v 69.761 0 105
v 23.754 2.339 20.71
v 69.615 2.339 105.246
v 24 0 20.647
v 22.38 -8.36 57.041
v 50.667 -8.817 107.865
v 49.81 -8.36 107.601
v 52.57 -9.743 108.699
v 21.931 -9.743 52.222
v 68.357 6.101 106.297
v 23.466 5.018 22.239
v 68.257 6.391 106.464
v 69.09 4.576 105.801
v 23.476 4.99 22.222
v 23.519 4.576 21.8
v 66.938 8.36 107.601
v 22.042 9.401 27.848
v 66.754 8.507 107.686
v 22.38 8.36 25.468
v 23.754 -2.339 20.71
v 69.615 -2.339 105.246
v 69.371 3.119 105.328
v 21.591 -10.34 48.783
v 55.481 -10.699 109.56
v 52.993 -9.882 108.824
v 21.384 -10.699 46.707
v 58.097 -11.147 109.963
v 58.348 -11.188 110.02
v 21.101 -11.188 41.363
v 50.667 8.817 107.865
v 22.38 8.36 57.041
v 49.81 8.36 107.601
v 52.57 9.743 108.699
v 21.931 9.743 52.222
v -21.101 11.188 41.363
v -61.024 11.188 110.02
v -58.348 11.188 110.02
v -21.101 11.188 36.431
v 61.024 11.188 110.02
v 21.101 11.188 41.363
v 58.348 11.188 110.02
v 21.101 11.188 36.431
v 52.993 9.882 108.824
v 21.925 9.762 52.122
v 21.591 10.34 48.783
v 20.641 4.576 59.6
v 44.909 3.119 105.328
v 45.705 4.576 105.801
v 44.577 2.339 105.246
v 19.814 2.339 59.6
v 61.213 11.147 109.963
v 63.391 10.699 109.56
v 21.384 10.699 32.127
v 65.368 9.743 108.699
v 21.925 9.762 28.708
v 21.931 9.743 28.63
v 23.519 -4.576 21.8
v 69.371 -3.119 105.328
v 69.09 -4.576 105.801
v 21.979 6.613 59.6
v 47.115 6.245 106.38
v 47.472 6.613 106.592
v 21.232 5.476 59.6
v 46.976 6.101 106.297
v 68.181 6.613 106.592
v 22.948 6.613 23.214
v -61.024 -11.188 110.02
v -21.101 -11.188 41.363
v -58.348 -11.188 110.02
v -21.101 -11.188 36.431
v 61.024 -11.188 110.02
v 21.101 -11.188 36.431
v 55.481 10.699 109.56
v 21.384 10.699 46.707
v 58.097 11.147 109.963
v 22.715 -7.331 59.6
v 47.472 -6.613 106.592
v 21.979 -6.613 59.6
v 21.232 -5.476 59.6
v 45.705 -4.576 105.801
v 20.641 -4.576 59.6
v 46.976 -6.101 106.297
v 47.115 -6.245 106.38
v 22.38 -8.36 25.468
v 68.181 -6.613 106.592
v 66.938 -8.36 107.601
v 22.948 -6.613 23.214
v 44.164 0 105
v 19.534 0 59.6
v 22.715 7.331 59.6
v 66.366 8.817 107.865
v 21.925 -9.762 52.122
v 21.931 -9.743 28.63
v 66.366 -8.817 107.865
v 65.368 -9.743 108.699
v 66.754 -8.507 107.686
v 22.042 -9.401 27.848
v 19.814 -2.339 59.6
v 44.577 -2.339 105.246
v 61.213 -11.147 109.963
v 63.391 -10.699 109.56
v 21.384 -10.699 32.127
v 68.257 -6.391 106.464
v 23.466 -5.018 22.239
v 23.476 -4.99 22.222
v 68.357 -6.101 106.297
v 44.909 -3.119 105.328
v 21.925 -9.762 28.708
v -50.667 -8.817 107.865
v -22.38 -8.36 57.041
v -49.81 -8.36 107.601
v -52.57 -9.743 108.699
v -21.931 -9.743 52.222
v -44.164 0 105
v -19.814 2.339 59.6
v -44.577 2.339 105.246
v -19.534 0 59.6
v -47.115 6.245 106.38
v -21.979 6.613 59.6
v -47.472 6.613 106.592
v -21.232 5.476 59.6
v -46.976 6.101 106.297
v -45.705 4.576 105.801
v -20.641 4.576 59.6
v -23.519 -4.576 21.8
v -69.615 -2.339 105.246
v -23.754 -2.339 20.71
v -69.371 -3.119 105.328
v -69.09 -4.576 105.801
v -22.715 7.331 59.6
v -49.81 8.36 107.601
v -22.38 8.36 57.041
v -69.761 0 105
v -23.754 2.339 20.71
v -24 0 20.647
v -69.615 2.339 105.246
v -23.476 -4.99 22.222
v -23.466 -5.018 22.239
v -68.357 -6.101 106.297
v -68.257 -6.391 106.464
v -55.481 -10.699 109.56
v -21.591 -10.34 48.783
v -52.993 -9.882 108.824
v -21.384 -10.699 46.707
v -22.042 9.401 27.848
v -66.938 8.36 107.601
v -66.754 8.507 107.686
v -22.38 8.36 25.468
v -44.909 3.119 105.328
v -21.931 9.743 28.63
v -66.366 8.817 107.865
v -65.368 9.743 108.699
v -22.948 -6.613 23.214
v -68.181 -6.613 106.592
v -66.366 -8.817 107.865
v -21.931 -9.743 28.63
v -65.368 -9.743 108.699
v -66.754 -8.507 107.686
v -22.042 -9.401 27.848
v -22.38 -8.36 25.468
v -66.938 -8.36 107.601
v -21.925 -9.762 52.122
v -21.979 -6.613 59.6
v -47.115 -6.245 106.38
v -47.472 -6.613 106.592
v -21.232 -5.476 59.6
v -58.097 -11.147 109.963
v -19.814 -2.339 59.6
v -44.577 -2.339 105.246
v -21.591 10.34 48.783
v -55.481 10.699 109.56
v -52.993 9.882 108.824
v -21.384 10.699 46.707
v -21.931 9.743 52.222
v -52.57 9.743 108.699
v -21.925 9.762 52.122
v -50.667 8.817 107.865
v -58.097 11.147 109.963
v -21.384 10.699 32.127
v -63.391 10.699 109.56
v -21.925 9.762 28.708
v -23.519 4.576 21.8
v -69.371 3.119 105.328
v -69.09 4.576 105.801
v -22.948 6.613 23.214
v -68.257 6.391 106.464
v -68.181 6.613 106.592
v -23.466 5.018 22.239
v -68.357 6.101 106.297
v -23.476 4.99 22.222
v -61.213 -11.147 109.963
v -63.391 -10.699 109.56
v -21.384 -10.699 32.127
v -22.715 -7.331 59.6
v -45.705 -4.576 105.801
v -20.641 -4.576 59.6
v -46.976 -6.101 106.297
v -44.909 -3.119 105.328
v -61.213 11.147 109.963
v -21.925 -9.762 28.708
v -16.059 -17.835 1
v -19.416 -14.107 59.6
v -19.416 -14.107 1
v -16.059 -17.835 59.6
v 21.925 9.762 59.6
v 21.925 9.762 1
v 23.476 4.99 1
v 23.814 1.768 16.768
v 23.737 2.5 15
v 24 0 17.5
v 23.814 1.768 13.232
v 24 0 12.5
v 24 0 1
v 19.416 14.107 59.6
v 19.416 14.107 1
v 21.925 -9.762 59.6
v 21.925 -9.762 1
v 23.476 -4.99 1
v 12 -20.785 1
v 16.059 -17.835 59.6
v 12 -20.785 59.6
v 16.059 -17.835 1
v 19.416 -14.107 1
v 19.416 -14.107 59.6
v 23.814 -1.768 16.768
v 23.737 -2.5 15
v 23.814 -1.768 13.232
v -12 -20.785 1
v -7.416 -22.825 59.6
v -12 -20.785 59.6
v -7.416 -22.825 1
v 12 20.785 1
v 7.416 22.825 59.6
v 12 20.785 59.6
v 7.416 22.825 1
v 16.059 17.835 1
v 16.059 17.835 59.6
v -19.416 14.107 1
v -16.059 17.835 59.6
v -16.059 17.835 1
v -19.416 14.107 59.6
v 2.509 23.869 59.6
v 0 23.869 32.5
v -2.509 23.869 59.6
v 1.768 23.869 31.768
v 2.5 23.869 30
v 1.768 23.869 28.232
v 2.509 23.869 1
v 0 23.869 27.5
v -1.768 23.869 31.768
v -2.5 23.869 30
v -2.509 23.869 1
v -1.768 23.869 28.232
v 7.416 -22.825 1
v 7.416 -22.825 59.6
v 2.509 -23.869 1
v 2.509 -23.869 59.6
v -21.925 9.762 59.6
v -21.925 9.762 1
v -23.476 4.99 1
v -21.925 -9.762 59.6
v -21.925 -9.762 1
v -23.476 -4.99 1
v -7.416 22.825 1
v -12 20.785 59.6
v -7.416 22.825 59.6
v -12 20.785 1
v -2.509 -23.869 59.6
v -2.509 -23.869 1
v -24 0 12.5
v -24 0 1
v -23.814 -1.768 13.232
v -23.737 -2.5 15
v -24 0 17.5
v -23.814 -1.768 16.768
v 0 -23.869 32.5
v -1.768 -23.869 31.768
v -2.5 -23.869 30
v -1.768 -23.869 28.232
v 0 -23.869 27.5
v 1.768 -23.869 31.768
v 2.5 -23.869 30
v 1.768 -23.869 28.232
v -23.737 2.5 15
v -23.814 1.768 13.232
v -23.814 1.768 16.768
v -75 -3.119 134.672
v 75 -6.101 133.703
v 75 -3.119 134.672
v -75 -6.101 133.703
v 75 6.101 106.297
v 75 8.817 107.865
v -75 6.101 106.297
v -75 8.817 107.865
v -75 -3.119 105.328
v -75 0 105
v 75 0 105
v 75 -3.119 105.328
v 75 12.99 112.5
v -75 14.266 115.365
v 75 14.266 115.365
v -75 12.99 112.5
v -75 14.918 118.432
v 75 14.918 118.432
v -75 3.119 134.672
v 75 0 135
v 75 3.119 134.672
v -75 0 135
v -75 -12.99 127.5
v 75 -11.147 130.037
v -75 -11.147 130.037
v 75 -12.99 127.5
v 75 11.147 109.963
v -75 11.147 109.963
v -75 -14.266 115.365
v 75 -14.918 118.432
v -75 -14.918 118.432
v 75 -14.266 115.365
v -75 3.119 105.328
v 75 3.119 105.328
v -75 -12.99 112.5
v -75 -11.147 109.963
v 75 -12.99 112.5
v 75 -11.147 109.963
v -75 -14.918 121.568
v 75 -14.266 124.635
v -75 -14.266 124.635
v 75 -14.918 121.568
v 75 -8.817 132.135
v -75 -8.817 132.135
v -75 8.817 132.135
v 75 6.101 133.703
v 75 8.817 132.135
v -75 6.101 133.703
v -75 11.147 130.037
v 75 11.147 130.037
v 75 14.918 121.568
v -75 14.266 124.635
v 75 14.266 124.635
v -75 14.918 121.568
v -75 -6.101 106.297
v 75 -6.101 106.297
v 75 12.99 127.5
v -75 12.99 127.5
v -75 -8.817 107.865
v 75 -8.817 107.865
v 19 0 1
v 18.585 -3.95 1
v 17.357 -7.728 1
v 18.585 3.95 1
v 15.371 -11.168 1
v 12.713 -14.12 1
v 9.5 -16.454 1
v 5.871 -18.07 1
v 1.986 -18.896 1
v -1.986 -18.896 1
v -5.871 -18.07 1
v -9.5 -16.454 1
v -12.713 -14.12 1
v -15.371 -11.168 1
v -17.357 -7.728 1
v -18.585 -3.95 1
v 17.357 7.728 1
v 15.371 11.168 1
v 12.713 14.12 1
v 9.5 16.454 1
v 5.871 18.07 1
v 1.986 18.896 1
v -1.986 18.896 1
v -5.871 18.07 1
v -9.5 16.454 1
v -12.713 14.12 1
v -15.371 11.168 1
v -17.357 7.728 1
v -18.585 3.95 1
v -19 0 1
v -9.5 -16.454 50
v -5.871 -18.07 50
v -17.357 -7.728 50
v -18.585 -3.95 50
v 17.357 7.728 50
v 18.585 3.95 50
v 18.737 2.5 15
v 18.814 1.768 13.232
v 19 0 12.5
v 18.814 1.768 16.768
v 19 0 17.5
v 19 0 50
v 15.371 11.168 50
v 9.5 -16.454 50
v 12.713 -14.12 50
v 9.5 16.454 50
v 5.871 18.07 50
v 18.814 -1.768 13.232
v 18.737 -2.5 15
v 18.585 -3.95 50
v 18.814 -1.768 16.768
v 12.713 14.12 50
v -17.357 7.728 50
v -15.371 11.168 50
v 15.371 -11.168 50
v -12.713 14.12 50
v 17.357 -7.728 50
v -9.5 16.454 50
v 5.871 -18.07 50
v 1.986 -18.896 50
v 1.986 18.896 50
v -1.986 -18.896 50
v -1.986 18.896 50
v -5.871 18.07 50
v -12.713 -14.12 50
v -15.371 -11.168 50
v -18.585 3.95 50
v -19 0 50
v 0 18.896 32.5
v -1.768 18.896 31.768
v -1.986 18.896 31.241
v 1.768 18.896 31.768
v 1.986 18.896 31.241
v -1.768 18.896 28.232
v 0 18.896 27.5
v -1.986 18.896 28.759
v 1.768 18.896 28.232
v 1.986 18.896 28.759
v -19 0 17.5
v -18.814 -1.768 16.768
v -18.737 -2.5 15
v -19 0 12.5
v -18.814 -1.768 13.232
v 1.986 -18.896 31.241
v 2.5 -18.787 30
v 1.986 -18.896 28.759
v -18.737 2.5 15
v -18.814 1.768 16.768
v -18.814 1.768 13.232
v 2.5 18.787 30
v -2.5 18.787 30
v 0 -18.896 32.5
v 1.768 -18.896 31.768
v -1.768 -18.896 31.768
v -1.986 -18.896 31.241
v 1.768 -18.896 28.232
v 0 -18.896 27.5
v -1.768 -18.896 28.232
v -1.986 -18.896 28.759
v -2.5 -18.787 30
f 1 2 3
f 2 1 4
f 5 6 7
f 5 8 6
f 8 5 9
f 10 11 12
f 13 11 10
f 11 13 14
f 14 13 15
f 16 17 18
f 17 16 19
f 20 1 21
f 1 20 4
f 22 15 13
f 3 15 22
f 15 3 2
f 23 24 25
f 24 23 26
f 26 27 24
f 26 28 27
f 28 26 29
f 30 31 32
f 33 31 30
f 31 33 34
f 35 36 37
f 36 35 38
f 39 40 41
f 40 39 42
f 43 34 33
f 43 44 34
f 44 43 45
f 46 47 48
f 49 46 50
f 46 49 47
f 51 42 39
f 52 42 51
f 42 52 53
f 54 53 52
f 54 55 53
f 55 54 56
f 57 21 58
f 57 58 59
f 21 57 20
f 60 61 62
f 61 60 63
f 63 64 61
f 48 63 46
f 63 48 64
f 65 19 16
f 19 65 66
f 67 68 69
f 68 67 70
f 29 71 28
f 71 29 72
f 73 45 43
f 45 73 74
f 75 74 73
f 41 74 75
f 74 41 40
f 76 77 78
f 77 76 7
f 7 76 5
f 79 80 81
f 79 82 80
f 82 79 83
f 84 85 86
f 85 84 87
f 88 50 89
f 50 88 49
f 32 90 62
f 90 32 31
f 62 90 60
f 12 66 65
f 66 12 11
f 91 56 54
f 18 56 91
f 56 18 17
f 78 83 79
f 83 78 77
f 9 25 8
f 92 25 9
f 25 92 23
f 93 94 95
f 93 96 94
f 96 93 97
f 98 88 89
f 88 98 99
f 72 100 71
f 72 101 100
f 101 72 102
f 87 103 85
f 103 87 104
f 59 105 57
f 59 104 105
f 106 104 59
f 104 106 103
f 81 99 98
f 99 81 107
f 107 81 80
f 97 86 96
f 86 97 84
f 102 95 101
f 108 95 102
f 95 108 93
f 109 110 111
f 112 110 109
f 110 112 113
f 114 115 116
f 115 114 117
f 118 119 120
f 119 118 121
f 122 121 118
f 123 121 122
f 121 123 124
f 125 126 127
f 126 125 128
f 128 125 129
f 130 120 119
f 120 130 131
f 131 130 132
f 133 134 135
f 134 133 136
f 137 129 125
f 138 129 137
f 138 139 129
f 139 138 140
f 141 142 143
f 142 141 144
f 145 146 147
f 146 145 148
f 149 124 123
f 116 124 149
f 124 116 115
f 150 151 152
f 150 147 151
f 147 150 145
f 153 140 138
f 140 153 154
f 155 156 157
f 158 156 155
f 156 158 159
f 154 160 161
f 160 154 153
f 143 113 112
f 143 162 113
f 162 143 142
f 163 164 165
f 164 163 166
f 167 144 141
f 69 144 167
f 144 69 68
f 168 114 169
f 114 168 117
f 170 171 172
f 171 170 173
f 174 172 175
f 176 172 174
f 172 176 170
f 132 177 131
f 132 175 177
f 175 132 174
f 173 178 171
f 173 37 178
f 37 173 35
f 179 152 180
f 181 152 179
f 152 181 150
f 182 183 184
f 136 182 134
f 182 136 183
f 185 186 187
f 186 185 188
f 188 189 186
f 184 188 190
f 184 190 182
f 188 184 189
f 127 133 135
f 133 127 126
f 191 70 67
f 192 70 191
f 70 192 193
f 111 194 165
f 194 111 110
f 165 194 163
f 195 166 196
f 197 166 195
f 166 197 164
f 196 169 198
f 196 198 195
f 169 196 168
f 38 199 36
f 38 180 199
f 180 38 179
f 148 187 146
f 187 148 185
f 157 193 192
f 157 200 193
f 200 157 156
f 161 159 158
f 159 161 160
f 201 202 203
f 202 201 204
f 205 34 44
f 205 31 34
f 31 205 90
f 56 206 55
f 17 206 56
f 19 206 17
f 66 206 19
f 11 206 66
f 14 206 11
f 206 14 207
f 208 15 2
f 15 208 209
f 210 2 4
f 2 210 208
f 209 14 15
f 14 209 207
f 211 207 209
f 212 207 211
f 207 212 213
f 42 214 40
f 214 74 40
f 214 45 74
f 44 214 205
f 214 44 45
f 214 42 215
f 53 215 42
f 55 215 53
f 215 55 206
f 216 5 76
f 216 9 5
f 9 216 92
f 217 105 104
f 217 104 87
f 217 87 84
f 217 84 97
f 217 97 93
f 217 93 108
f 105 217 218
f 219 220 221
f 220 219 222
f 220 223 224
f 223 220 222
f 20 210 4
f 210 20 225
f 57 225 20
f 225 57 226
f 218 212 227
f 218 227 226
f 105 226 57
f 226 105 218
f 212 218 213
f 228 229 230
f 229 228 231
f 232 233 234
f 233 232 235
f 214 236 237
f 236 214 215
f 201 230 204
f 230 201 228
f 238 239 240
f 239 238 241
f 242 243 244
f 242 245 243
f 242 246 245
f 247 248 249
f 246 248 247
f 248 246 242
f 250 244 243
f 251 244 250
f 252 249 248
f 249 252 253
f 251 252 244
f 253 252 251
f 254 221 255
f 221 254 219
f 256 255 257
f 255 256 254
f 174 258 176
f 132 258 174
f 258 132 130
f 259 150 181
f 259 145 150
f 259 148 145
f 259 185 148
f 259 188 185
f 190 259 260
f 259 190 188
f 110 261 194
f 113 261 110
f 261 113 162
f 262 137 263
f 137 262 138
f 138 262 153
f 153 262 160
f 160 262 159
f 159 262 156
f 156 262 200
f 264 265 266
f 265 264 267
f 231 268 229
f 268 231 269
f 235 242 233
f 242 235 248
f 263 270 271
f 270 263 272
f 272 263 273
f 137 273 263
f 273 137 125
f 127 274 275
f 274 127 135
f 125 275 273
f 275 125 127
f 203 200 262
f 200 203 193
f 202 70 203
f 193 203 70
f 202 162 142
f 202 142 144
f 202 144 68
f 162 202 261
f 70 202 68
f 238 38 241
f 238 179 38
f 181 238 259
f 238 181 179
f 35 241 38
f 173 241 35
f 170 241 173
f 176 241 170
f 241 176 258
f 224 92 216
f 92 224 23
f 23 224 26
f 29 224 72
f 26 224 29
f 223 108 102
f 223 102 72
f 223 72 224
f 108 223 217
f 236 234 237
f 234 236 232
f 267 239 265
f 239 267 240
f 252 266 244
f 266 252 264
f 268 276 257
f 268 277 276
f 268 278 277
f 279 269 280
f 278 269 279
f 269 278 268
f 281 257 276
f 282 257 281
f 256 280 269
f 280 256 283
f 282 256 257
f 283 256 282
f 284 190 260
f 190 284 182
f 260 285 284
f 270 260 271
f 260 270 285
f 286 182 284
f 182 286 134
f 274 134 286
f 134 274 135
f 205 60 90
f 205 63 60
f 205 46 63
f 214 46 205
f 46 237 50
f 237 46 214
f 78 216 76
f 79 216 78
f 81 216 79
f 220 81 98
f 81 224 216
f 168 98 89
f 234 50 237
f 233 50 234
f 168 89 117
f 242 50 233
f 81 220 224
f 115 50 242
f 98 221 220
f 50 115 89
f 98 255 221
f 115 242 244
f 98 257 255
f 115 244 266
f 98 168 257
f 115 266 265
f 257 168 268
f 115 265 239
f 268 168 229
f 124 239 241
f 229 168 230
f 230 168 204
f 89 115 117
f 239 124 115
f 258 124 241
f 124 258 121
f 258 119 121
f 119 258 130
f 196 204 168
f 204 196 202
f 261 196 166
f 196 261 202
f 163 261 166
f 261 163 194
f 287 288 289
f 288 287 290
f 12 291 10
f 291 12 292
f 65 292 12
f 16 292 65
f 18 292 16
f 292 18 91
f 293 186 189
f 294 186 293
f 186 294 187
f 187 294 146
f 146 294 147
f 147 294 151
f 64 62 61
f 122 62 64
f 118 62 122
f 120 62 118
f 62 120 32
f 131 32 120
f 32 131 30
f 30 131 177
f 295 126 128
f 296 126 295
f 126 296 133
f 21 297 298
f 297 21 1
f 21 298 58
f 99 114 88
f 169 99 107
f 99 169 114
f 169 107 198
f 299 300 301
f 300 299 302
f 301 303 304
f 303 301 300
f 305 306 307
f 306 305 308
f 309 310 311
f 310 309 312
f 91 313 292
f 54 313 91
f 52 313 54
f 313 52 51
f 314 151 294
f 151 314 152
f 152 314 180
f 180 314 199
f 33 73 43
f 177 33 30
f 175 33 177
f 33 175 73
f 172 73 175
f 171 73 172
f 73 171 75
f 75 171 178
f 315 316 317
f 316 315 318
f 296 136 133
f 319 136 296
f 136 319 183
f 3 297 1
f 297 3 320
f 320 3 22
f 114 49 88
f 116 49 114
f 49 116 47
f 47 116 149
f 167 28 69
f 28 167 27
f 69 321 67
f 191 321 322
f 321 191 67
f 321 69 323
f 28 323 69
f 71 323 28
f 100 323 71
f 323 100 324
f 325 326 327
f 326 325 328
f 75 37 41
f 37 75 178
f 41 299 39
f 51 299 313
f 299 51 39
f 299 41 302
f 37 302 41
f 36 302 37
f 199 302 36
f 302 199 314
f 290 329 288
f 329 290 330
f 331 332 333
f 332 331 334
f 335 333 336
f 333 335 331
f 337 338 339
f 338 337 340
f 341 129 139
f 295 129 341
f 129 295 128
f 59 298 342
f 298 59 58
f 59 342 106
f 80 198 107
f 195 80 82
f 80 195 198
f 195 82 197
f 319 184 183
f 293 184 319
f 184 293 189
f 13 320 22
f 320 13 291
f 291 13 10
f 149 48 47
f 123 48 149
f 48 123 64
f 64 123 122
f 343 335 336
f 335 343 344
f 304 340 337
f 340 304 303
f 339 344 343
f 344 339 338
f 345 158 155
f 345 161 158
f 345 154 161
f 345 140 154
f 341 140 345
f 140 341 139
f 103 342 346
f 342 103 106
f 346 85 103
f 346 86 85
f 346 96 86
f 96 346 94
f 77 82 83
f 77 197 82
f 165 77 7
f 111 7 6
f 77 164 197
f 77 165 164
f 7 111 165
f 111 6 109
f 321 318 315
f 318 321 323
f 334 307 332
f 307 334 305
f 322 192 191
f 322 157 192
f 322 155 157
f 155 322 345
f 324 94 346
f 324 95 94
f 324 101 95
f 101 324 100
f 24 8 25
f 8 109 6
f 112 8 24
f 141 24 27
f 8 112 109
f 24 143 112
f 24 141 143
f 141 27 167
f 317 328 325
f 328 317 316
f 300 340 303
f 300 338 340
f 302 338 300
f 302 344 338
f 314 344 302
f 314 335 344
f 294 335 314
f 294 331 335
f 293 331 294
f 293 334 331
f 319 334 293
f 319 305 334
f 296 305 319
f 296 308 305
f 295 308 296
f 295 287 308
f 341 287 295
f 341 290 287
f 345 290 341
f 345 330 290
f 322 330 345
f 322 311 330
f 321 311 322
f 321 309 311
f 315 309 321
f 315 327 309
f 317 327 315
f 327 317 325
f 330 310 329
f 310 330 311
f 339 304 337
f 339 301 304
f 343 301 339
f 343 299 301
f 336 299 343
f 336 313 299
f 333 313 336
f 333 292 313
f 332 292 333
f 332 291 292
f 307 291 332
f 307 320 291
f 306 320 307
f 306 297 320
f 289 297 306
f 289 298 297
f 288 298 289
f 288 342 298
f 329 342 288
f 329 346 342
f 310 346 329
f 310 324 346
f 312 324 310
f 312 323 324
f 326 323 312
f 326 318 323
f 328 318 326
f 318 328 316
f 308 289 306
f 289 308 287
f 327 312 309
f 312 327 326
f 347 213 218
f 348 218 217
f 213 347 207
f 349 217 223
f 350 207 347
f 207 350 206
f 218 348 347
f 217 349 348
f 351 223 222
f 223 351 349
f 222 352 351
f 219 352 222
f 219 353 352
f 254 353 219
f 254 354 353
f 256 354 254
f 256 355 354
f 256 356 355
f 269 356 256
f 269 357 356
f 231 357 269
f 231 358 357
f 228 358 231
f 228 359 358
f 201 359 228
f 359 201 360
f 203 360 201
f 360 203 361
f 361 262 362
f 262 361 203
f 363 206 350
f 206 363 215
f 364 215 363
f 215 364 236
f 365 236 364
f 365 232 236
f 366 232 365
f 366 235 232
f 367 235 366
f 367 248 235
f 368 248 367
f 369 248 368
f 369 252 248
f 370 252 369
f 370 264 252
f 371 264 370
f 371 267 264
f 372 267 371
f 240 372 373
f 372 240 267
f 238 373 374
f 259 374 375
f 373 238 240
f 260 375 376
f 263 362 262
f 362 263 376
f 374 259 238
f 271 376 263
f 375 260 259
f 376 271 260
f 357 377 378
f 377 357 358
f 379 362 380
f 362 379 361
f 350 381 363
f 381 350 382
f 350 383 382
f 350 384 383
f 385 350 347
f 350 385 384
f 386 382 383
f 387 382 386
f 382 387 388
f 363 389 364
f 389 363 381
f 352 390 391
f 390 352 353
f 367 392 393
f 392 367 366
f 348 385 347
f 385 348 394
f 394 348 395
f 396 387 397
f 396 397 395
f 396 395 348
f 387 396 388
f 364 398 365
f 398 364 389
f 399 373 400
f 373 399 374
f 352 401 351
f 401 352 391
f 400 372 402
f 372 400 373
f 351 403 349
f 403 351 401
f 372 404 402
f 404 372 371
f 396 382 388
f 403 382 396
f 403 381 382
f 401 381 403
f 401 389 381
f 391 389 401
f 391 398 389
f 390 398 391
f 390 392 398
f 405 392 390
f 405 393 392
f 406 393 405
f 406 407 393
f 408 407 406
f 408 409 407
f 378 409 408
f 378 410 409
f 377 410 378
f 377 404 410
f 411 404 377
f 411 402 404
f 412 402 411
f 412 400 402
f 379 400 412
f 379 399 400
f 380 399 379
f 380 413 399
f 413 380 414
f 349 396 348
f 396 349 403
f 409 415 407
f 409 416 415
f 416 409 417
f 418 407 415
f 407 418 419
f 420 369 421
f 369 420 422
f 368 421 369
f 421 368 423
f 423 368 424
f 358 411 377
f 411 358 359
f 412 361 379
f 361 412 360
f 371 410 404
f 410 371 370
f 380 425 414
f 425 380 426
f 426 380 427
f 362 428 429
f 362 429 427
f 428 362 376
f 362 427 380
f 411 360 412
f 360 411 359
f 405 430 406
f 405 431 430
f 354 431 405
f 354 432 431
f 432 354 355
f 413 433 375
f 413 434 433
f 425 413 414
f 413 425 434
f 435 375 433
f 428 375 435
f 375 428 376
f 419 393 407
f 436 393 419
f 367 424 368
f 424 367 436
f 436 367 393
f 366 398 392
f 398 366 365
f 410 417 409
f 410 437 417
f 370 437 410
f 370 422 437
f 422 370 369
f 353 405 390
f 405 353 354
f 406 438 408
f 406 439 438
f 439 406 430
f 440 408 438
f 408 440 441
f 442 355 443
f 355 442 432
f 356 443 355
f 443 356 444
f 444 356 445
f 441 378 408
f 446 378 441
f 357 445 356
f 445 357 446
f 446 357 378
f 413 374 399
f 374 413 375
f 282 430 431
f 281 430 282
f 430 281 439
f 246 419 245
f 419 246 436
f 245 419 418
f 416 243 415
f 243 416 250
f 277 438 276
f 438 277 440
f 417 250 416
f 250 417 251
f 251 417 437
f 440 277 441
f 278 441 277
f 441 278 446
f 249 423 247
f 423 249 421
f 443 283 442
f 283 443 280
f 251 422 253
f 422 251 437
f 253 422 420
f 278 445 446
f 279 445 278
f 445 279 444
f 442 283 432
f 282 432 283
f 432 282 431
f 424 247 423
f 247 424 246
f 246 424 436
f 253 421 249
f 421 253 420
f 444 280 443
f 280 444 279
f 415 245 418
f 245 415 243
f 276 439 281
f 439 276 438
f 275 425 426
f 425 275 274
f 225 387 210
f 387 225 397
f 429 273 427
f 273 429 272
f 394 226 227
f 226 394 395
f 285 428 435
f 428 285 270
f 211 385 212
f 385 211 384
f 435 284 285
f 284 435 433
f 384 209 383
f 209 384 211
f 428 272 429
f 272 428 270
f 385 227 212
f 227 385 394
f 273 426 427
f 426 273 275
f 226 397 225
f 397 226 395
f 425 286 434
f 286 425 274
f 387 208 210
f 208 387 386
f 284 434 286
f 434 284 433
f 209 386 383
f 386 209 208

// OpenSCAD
/*[Overall Dimesnions]*/

// length of overlap on handle
O_Length = 50;

// Inner Diameter of overlap
In_Dia = 38;

// Outer diamter of overlap
Out_Dia = 48;

// length from start of overlap to center of grip
S_Length = 120;

// diameter of Grip
G_Dia = 30;

// length of grip
G_Length = 150;

// distance to trim (leave here at 40, unless model comes out with excess from the rods)
trim = 40;

/*[mounting holes]*/

// You can have up to 3 holes, for more add to the source code
// Holes will be completly through from one side to the other of the overlap

// Hole 1 diameter
H1_Dia = 5;

// Hole 1 X location
H1_X = 0;

// Hole 1 Y location
H1_Y = 0;

// Hole 1 Z loaction
H1_Z = 30;

// Hole 1 X Rotation
H1_Xrot = 90;

// Hole 1 Y Rotaion
H1_Yrot = 0;

// Hole 1 Z Rotation
H1_Zrot = 0;

// Hole 2 diameter ((leave at 0 to not have))
H2_Dia = 5;

// Hole 2 X location
H2_X = 0;

// Hole 2 Y location
H2_Y = 0;

// Hole 2 Z loaction
H2_Z = 15;

// Hole 2 X Rotation
H2_Xrot = 0;

// Hole 2 Y Rotaion
H2_Yrot = 90;

// Hole 2 Z Rotation
H2_Zrot = 0;

// Hole 3 diameter ((leave at 0 to not have))
H3_Dia = 0;

// Hole 3 X location
H3_X = 0;

// Hole 3 Y location
H3_Y = 0;

// Hole 3 Z loaction
H3_Z = 0;

// Hole 3 X Rotation
H3_Xrot = 0;

// Hole 3 Y Rotaion
H3_Yrot = 0;

// Hole 3 Z Rotation
H3_Zrot = 0;
/*[Hidden]*/

// math
hyp = sqrt(pow(S_Length, 2) + pow(.5 * G_Length, 2));

// angle
angle = atan(((.5 * G_Length) - (.33 * G_Dia)) / S_Length);

// overlap section
module overlap()
{
    difference()
    {
        cylinder(h = O_Length, d = Out_Dia, center = false);
    }
}

// handle to grip
module grip()
{
    rotate([ 0, 90, 0 ]) translate([ -S_Length, 0, 0 ]) cylinder(h = G_Length, d = G_Dia, center = true);
}

// now, try to make the important part the connetor beams
module bars()
{
    union()
    {
        rotate([ 0, angle, 0 ]) cylinder(h = hyp, d = .75 * G_Dia, center = false);
        rotate([ 0, -angle, 0 ]) cylinder(h = hyp, d = .75 * G_Dia, center = false);
    }
}

// cap to cover top of wooden shovel handle
module cap()
{
    translate([ 0, 0, O_Length ]) cylinder(h = .2 * Out_Dia, d = Out_Dia, center = false);
}

// mounting holes
module hole_1()
{
    translate([ H1_X, H1_Y, H1_Z ]) rotate([ H1_Xrot, H1_Yrot, H1_Zrot ])
        cylinder(h = Out_Dia * 2, d = H1_Dia, center = true);
}

module hole_2()
{
    translate([ H2_X, H2_Y, H2_Z ]) rotate([ H2_Xrot, H2_Yrot, H2_Zrot ])
        cylinder(h = Out_Dia * 2, d = H2_Dia, center = true);
}

module hole_3()
{
    translate([ H3_X, H3_Y, H3_Z ]) rotate([ H3_Xrot, H3_Yrot, H3_Zrot ])
        cylinder(h = Out_Dia * 2, d = H3_Dia, center = true);
}

// joing solid parts together
module handle_together()
{
    union()
    {
        overlap();
        cap();
        bars();
        grip();
    }
}

// pulling hollow, trimming parts out
module trimmed()
{
    difference()
    {
        handle_together();
        rotate([ 0, 180, 0 ]) translate([ 0, 0, -1 ]) cylinder(h = trim, d = Out_Dia + 20, center = false);
        rotate([ 0, 90, 0 ]) translate([ -S_Length, 0, .5 * G_Length ])
            cylinder(h = trim, d = G_Dia + 20, center = false);
        rotate([ 0, 90, 0 ]) translate([ -S_Length, 0, -.5 * G_Length - trim ])
            cylinder(h = trim, d = G_Dia + 20, center = false);
        cylinder(h = O_Length, d = In_Dia, center = false);
        hole_1();
        hole_2();
        hole_3();
    }
}
trimmed();
